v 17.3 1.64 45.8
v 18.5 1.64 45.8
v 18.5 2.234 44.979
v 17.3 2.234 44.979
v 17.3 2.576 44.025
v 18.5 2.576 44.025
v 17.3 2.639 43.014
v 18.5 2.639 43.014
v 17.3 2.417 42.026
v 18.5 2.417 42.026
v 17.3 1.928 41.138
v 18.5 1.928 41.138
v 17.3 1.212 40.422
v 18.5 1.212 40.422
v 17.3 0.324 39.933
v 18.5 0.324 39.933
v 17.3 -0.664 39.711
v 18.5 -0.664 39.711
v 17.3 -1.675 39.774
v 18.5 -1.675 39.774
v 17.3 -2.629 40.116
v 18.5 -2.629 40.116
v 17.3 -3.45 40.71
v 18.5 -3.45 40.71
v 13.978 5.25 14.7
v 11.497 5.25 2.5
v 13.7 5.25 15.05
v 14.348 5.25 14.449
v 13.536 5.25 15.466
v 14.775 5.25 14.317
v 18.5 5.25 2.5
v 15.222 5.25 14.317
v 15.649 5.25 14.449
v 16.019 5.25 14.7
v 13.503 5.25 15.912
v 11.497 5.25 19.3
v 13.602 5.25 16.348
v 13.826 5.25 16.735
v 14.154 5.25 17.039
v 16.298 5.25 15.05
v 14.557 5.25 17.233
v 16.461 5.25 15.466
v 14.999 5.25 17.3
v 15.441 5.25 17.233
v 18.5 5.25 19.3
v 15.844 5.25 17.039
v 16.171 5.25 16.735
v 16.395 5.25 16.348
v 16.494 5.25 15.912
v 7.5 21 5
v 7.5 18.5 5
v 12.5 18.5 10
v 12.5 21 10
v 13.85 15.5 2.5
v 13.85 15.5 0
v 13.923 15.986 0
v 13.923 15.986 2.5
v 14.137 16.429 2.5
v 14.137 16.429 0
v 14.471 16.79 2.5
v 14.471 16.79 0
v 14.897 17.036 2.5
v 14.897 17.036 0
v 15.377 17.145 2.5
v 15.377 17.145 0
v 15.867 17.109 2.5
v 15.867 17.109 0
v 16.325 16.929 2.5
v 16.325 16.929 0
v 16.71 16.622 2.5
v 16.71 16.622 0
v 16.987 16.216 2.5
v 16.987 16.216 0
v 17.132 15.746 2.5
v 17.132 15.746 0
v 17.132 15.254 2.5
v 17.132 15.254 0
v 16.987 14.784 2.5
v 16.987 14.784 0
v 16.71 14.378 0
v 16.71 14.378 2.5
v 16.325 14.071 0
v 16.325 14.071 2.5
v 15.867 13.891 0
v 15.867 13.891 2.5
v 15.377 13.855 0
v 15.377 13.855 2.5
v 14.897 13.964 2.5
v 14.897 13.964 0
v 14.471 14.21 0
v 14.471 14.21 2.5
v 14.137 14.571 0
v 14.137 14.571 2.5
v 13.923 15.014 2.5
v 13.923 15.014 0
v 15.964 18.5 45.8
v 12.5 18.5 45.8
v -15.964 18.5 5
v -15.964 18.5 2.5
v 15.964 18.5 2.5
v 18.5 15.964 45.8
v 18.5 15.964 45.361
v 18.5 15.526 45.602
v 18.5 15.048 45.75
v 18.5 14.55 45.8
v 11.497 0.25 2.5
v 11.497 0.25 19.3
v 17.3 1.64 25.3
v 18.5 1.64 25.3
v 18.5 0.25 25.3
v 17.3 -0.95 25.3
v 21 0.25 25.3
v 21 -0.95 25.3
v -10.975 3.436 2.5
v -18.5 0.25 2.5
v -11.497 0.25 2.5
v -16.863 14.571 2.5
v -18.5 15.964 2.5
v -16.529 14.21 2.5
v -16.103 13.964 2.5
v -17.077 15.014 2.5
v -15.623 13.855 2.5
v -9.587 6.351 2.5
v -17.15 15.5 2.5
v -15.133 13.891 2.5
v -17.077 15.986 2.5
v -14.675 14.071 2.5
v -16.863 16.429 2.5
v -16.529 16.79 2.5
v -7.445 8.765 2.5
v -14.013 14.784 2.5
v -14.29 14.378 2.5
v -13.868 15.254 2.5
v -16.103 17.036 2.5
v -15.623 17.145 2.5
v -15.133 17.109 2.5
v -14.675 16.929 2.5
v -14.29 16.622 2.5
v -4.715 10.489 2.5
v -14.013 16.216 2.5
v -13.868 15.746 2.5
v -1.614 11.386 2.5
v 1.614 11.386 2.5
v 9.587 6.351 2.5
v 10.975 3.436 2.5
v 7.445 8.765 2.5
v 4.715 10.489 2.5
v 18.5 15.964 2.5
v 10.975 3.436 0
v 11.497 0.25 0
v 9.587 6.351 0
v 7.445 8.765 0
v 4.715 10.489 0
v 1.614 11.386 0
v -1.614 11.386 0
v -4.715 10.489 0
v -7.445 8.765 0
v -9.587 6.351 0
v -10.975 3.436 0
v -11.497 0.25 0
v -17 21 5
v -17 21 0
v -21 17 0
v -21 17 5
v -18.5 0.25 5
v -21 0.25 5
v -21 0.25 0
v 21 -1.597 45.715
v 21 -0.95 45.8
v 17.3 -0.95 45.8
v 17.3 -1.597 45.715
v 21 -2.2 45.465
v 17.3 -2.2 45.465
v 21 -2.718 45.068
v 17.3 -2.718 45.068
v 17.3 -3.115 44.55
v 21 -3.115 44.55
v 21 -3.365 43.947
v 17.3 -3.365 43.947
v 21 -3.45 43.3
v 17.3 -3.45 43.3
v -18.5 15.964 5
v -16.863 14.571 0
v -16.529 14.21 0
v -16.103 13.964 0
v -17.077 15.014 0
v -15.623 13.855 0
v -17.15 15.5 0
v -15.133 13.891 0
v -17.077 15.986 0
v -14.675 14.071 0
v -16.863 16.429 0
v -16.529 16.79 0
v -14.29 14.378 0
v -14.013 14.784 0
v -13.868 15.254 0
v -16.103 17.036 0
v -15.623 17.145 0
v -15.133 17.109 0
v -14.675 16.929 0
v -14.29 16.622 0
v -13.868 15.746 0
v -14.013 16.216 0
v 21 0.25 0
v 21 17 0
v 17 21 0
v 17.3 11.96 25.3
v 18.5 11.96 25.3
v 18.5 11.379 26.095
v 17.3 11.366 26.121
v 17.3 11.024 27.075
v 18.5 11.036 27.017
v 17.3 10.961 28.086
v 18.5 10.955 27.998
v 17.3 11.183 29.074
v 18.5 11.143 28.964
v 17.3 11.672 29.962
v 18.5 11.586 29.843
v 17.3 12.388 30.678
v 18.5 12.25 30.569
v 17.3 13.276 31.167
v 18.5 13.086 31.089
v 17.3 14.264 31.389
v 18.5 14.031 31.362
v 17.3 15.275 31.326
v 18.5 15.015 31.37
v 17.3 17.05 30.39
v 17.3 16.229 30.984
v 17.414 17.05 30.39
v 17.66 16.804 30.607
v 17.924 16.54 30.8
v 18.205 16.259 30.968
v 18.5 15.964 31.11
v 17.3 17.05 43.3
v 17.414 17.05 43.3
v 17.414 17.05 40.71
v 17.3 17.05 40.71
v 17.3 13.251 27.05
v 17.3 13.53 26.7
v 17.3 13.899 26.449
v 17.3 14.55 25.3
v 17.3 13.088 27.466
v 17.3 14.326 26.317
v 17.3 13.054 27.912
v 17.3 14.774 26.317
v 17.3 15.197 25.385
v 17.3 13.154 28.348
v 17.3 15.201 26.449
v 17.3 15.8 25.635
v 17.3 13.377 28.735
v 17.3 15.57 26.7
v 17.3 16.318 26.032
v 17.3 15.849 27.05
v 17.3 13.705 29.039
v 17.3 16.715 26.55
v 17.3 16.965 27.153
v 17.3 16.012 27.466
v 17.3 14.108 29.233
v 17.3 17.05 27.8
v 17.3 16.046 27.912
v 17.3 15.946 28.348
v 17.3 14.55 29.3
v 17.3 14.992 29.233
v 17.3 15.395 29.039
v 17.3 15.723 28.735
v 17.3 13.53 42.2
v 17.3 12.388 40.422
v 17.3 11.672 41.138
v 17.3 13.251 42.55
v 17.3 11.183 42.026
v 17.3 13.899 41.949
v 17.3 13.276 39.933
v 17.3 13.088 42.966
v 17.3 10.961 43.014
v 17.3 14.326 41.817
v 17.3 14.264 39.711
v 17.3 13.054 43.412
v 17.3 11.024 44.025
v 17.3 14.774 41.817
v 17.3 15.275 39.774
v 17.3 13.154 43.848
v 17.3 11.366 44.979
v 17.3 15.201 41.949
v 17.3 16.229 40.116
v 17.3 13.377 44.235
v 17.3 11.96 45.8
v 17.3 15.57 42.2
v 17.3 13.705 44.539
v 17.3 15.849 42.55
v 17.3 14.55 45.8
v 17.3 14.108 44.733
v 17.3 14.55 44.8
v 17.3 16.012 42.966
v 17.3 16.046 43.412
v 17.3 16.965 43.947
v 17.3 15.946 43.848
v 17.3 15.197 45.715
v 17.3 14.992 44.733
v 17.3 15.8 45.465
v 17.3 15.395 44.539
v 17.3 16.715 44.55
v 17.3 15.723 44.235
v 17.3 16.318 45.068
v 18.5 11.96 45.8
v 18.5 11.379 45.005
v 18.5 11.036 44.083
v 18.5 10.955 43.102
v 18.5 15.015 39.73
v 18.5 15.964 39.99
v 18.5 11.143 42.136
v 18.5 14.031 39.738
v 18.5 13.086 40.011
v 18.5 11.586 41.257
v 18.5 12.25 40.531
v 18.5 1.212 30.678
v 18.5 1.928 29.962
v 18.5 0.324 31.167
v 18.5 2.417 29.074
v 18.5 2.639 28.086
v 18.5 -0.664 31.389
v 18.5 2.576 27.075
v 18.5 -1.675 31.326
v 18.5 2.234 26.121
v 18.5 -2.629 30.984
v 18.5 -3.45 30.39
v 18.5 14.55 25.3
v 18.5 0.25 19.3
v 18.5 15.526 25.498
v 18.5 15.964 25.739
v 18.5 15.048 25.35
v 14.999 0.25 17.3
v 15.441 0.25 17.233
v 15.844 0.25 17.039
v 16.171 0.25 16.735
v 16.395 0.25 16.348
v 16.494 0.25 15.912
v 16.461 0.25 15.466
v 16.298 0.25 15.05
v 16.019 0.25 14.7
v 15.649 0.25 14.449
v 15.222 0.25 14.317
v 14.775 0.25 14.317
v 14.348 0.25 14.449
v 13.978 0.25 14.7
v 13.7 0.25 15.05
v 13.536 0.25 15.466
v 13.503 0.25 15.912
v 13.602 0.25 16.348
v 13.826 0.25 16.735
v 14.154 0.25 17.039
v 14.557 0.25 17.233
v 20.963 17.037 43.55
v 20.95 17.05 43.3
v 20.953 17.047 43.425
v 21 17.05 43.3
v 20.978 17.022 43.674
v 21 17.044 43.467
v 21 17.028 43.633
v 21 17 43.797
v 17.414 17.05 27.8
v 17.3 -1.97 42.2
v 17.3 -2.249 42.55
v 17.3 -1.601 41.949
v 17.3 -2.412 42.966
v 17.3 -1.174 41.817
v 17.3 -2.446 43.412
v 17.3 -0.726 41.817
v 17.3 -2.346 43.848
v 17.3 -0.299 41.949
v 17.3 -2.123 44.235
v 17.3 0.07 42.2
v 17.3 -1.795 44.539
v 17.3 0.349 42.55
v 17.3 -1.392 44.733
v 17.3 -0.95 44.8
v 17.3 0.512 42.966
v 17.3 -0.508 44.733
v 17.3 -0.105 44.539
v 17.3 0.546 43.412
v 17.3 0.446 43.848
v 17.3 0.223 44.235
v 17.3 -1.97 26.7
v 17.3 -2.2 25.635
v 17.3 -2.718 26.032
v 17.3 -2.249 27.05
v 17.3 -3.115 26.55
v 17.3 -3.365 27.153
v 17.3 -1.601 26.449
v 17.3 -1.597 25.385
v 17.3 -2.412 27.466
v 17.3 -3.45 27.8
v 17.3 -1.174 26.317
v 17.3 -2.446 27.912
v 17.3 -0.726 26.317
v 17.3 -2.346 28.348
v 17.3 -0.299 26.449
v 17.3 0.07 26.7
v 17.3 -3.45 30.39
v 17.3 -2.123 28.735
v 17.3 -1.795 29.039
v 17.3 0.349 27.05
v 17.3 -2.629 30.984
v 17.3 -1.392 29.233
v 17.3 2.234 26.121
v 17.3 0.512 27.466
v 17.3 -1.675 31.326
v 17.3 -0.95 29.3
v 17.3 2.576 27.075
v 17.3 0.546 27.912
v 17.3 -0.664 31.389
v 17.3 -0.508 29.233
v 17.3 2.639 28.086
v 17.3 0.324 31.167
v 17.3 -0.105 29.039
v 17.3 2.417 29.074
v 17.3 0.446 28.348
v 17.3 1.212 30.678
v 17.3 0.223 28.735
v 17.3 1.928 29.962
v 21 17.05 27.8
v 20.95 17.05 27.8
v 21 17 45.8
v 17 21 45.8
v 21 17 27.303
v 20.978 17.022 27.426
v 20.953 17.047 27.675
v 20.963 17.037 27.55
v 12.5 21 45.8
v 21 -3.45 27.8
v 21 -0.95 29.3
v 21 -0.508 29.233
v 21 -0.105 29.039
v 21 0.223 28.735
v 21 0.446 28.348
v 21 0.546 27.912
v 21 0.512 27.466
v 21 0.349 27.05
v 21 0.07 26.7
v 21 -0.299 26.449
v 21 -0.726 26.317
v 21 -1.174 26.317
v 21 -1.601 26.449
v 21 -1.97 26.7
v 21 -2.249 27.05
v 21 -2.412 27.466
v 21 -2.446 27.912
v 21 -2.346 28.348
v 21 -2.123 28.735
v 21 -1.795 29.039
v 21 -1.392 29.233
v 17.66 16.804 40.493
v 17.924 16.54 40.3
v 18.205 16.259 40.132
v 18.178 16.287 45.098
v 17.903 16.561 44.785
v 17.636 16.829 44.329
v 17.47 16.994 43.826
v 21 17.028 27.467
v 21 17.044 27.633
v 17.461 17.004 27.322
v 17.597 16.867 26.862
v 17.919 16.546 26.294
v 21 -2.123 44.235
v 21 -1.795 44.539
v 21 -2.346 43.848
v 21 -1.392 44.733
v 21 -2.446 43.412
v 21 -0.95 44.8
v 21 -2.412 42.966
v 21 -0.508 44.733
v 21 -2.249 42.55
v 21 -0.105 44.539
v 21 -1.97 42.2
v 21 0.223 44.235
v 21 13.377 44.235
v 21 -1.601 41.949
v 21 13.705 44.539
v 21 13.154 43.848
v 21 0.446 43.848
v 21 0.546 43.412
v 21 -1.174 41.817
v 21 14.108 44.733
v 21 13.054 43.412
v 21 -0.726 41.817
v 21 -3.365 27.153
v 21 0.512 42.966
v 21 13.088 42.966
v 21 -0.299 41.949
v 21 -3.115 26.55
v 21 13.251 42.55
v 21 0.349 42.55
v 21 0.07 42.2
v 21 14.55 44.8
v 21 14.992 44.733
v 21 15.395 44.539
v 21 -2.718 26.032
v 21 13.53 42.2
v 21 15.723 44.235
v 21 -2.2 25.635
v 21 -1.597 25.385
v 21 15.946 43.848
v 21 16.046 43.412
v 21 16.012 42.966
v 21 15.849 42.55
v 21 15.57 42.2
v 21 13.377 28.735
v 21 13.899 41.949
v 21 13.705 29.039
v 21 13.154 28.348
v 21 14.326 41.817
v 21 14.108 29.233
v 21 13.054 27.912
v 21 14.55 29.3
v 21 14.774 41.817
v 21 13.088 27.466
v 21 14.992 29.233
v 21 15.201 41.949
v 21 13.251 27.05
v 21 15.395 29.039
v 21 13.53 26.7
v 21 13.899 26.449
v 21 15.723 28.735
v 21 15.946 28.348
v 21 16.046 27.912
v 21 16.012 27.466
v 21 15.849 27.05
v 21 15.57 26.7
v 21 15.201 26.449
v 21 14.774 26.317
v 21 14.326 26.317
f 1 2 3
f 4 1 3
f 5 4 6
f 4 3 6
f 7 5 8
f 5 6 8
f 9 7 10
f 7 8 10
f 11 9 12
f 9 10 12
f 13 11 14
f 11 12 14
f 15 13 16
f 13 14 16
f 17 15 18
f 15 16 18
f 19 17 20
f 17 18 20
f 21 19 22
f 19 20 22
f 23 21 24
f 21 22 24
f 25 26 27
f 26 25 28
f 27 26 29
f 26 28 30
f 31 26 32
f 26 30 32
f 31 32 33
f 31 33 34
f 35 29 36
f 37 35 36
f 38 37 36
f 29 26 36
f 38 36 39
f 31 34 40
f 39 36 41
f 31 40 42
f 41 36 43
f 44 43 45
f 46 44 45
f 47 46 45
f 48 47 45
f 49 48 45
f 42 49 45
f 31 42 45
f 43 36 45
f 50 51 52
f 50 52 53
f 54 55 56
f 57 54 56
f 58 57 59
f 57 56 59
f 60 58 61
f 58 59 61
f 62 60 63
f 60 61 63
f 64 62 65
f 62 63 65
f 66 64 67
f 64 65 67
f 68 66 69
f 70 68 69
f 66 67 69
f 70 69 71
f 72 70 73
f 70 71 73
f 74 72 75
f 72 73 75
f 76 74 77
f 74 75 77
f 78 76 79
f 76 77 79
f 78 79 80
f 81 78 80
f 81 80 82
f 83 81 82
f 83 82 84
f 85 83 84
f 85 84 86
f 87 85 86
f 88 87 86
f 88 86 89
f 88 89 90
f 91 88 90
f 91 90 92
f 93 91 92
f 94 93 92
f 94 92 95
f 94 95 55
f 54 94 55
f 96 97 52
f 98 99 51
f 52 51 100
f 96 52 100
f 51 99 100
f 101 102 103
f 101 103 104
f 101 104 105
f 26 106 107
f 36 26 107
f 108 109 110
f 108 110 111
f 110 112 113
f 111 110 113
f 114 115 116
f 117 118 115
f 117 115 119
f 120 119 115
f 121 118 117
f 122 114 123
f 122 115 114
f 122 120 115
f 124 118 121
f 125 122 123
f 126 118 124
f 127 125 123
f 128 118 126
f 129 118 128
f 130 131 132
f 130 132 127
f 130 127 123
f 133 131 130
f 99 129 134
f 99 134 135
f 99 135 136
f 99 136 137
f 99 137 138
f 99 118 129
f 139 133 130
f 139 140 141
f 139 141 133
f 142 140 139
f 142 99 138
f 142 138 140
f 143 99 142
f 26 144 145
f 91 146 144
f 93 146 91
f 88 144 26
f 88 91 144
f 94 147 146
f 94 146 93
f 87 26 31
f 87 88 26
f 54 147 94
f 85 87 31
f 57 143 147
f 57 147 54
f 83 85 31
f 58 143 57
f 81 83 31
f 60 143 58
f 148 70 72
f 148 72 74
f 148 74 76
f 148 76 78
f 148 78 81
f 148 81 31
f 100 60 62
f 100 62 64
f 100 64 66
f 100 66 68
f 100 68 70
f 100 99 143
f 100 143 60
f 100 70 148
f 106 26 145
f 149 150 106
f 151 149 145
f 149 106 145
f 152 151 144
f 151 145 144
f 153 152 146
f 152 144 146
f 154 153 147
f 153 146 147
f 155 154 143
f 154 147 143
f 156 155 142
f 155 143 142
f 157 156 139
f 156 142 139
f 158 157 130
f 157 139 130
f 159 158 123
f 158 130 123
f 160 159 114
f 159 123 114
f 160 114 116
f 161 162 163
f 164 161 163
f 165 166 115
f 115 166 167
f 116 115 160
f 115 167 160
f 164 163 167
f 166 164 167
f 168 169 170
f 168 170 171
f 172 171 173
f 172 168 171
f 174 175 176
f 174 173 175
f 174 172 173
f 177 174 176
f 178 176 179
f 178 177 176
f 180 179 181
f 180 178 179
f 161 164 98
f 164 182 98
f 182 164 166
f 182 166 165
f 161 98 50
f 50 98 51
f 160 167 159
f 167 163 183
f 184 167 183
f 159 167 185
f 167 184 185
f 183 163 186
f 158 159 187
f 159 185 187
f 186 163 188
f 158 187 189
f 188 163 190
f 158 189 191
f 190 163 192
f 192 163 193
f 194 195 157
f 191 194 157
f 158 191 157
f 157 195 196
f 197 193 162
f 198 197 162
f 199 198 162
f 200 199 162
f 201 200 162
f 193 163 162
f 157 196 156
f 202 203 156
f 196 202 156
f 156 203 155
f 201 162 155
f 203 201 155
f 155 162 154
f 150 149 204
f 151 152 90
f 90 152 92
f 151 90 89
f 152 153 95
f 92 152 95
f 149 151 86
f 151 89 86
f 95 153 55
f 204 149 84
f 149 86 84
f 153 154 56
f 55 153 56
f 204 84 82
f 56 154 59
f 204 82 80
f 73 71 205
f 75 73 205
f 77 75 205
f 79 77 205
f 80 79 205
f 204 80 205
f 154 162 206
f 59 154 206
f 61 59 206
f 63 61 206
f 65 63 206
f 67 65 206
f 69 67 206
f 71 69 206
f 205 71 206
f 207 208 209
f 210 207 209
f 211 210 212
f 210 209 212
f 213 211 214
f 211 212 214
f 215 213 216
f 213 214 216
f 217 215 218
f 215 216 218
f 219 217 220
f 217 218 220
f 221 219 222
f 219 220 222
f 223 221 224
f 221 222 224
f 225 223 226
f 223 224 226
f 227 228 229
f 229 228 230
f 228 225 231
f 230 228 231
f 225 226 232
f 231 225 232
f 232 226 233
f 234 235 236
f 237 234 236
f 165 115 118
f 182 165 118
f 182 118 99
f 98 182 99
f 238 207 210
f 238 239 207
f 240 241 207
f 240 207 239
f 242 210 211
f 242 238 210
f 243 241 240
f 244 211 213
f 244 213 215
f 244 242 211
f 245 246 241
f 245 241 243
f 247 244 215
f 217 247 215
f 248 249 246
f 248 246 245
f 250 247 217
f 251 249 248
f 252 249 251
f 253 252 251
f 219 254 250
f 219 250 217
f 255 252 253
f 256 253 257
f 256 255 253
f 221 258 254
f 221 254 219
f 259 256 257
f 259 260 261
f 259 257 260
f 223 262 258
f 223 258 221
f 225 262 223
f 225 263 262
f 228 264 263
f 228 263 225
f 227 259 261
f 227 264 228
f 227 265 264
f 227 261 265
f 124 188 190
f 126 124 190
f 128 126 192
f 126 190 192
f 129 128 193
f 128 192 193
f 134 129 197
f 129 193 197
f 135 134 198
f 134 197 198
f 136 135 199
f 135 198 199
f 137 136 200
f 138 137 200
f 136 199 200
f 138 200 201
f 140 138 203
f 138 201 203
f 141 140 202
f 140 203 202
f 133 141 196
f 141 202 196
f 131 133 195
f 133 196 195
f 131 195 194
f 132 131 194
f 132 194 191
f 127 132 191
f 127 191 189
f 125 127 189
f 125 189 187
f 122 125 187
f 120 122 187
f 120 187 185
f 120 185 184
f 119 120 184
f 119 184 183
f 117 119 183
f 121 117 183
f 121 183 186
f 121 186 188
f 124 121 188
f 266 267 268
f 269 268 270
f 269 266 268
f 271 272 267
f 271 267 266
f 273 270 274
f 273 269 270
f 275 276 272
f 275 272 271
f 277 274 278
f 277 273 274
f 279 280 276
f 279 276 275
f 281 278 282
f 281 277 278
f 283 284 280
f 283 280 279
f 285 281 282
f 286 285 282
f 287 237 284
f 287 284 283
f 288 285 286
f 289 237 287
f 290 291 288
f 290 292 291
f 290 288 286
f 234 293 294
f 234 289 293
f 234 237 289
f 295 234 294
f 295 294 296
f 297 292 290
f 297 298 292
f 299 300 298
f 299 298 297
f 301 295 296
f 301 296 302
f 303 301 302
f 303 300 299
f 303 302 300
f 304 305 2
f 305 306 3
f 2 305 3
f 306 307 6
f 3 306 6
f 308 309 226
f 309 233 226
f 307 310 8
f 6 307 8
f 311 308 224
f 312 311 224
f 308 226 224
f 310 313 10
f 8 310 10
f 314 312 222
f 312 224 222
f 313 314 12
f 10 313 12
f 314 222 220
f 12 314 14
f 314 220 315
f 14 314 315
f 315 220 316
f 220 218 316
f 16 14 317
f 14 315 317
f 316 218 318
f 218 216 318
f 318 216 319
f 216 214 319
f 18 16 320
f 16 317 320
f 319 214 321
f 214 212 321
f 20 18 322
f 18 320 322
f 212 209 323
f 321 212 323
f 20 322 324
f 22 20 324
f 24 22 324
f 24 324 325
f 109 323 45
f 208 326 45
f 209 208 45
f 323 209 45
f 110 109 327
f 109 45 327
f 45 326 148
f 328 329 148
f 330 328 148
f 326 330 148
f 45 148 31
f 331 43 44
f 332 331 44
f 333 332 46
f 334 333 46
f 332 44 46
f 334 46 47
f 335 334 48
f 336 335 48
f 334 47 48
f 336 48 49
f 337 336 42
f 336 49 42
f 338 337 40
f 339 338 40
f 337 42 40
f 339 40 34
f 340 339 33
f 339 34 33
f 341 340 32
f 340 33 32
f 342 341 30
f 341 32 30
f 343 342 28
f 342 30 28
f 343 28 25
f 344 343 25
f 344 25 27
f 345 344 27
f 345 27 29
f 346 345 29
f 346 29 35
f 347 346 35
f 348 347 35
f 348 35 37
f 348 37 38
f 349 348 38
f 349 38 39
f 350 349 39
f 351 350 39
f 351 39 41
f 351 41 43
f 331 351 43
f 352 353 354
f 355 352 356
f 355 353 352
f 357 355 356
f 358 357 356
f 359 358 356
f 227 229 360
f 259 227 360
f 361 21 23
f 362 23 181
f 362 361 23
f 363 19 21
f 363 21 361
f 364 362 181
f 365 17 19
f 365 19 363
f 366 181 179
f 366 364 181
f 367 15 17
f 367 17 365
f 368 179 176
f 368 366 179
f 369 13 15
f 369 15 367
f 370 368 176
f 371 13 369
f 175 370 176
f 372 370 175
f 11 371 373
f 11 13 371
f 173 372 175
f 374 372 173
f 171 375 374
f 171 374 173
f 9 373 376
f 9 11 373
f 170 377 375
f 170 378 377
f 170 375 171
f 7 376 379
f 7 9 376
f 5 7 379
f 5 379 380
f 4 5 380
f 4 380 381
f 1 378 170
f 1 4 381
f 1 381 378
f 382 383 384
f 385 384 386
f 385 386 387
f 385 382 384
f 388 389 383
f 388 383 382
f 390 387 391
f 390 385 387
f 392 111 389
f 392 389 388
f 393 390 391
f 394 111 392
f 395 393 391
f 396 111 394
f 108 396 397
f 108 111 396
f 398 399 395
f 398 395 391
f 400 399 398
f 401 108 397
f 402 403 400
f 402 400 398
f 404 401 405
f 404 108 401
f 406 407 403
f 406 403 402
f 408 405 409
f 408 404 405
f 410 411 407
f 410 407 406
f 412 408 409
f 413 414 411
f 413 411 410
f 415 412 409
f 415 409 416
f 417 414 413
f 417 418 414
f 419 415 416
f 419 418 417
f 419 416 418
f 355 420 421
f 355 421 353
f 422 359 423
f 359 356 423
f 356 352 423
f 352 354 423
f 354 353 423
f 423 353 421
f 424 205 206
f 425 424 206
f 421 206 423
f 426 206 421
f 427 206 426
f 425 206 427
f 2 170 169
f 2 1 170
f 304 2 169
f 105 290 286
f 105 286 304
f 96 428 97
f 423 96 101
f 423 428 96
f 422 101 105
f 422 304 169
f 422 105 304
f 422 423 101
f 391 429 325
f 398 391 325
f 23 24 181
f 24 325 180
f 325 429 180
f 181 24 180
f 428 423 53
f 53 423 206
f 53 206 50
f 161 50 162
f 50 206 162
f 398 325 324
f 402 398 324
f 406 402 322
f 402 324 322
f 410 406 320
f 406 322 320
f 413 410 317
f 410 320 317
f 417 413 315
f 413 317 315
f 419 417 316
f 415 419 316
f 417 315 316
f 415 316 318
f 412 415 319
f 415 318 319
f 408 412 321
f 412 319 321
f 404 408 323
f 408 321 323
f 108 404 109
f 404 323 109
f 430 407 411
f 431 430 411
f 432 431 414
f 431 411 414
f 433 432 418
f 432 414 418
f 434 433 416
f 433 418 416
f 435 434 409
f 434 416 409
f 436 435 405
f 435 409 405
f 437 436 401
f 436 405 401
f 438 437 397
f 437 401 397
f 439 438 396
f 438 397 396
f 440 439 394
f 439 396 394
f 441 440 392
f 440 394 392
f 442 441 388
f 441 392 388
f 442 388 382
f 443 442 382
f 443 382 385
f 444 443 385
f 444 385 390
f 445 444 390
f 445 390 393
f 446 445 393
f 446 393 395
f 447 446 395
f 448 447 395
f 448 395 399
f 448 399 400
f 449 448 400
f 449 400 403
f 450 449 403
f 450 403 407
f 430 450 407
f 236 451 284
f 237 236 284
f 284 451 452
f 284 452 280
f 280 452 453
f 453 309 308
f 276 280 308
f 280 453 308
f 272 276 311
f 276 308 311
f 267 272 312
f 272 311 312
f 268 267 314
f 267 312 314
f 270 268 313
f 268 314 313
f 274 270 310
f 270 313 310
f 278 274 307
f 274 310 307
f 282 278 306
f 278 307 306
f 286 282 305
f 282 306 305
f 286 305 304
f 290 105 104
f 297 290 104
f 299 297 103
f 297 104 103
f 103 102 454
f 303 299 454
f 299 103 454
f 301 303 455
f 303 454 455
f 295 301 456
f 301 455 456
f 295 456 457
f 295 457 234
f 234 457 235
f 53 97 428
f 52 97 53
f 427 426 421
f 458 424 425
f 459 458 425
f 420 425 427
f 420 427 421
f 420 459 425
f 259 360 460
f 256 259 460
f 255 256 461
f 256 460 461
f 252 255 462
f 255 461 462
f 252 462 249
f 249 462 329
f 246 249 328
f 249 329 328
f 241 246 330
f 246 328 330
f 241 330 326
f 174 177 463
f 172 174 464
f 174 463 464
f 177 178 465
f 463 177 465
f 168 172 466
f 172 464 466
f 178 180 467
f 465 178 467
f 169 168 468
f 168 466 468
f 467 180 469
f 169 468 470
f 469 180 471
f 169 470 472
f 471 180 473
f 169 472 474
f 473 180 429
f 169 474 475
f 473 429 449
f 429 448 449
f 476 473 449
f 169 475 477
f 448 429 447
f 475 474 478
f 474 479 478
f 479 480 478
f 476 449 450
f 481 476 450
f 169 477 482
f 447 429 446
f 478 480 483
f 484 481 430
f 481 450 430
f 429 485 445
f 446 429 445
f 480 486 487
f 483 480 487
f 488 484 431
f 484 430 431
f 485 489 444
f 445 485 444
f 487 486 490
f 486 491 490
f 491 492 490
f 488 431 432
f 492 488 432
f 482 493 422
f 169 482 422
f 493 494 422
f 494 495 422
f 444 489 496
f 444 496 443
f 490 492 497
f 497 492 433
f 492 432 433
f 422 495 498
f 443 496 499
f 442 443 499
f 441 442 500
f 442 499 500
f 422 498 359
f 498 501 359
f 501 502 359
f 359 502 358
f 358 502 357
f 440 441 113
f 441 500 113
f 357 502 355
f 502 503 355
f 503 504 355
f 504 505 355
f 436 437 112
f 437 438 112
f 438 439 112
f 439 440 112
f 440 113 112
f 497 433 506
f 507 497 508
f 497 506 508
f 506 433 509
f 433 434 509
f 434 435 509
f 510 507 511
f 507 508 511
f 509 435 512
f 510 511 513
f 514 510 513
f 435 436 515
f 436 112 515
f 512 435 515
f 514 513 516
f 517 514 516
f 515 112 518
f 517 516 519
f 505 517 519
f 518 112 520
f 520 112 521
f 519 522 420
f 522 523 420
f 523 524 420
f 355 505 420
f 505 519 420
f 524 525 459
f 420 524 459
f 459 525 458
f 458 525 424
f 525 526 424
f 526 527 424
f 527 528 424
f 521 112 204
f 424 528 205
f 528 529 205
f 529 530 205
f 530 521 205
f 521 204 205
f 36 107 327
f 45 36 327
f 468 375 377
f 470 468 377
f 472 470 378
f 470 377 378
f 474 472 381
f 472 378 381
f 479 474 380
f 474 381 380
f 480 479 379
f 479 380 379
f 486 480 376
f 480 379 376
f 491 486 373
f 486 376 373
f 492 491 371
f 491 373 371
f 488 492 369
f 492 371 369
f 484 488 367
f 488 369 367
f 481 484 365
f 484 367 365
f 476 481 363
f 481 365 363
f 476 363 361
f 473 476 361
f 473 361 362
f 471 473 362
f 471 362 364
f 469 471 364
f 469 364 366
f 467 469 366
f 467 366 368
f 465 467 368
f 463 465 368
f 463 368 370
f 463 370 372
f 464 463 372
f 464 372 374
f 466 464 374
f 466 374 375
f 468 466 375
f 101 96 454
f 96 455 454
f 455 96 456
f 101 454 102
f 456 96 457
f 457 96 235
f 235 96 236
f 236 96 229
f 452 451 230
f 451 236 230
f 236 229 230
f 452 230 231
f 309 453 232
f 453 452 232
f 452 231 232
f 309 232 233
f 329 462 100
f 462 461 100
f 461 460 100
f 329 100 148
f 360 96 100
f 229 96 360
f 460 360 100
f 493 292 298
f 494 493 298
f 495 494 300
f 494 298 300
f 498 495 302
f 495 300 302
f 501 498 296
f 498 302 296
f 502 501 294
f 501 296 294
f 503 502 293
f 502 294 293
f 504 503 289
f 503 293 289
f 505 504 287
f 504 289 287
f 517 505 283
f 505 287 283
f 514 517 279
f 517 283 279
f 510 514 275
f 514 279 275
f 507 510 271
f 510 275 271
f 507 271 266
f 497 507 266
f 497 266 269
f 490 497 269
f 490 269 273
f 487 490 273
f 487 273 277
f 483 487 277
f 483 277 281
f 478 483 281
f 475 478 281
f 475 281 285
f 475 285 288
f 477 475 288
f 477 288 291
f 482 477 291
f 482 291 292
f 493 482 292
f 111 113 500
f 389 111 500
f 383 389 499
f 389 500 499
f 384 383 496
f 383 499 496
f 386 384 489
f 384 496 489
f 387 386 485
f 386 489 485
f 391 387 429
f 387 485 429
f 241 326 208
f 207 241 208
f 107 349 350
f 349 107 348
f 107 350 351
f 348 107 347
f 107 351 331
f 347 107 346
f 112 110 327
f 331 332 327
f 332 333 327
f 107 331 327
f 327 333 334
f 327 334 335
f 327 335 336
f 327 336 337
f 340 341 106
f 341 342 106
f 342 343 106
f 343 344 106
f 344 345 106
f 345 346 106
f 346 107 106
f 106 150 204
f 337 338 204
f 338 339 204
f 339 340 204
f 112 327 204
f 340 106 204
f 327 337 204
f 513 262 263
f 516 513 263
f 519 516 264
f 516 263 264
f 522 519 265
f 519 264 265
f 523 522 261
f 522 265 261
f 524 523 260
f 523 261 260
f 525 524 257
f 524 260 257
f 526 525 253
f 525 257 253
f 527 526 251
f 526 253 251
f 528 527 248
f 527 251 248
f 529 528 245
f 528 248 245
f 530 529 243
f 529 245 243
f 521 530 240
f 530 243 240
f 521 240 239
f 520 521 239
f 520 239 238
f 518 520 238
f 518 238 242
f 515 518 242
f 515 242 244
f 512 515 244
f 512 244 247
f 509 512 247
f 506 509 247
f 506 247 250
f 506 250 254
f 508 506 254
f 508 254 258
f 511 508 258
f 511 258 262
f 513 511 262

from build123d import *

# Parameters (mm, degrees)
BOSS_EXTRUDE1_DEPTH     = 2.5
SKETCH2_R               = 11.5
CUT_EXTRUDE1_DEPTH      = 3
SKETCH3_R               = 1.65
CUT_EXTRUDE2_DEPTH      = 3
EXTRUDE_THIN1_DEPTH     = 43.3
BOSS_EXTRUDE2_DEPTH     = 2.5
CUT_EXTRUDE3_DEPTH      = 57.003950753
CUT_EXTRUDE3_DEPTH_BACK = 57.003950753
SKETCH7_W               = 33.5
SKETCH7_H               = 40.8
CHAMFER1_SIZE           = 5
BOSS_EXTRUDE3_DEPTH     = 1.2
SKETCH10_R              = 1.5
CUT_EXTRUDE4_DEPTH      = 10
SKETCH12_W              = 9.502717712
SKETCH12_H              = 19.3
BOSS_EXTRUDE4_DEPTH     = 5
SKETCH13_R              = 1.5
CUT_EXTRUDE5_DEPTH      = 53.789227121


with BuildPart() as part:
    # Sketch1 → Boss-Extrude1 (new body)
    with BuildSketch(Plane.XY):
        Polygon((-21, 0.25), (21, 0.25), (21, 17), (17, 21), (-17, 21), (-21, 17), align=None)
    extrude(amount=BOSS_EXTRUDE1_DEPTH)

    # Sketch2 → Cut-Extrude1 (cut)
    with BuildSketch(Plane.XY.offset(2.5)):
        Circle(SKETCH2_R)
    extrude(amount=-CUT_EXTRUDE1_DEPTH, mode=Mode.SUBTRACT)

    # Sketch3 → Cut-Extrude2 (cut)
    with BuildSketch(Plane(origin=(0, 0, 0), x_dir=(-1, 0, 0), z_dir=(0, 0, -1))):
        with Locations((15.5, 15.5)):
            Circle(SKETCH3_R)
        with Locations((-15.5, 15.5)):
            Circle(SKETCH3_R)
    extrude(amount=-CUT_EXTRUDE2_DEPTH, mode=Mode.SUBTRACT)

    # Sketch4 → Extrude-Thin1 (add)
    with BuildSketch(Plane.XY.offset(2.5)):
        Polygon((21, 0.25), (21, 17), (17, 21), (-17, 21), (-21, 17), (-21, 0.25), (-18.5, 0.25), (-18.5, 15.964466094), (-15.964466094, 18.5), (15.964466094, 18.5), (18.5, 15.964466094), (18.5, 0.25), align=None)
    extrude(amount=EXTRUDE_THIN1_DEPTH)

    # Sketch6 → Boss-Extrude2 (add)
    with BuildSketch(Plane(origin=(21, 0, 0), x_dir=(0, 0, -1), z_dir=(1, 0, 0))):
        with BuildLine():
            Line((-45.8, 14.55), (-45.8, -0.95))
            ThreePointArc((-45.8, -0.95), (-45.067766953, -2.717766953), (-43.3, -3.45))
            Line((-43.3, -3.45), (-27.8, -3.45))
            ThreePointArc((-27.8, -3.45), (-26.032233047, -2.717766953), (-25.3, -0.95))
            Line((-25.3, -0.95), (-25.3, 14.55))
            ThreePointArc((-25.3, 14.55), (-26.032233047, 16.317766953), (-27.8, 17.05))
            Line((-27.8, 17.05), (-43.3, 17.05))
            ThreePointArc((-43.3, 17.05), (-45.067766953, 16.317766953), (-45.8, 14.55))
        make_face()
    extrude(amount=-BOSS_EXTRUDE2_DEPTH)

    # Sketch7 → Cut-Extrude3 (cut, two sides: drawn at the far end of the back side and taken through both)
    with BuildSketch(Plane(origin=(0, 21, 0), x_dir=(1, 0, 0), z_dir=(0, 1, 0)).offset(-CUT_EXTRUDE3_DEPTH_BACK)):
        with Locations((-4.25, -25.4)):
            Rectangle(SKETCH7_W, SKETCH7_H)
    extrude(amount=CUT_EXTRUDE3_DEPTH + CUT_EXTRUDE3_DEPTH_BACK, mode=Mode.SUBTRACT)

    # Chamfer1
    chamfer1_edges = [part.edges().sort_by_distance(p)[0] for p in [
        (12.5, 19.75, 5),
    ]]
    chamfer(chamfer1_edges, length=CHAMFER1_SIZE)

    # Sketch8 → Boss-Extrude3 (add)
    with BuildSketch(Plane.ZY.offset(-18.5)):
        with BuildLine():
            Line((27.8, -3.45), (30.390366769, -3.45))
            ThreePointArc((30.390366769, -3.45), (30.345584412, 1.595584412), (25.3, 1.640366769))
            Line((25.3, 1.640366769), (25.3, -0.95))
            ThreePointArc((25.3, -0.95), (26.032233047, -2.717766953), (27.8, -3.45))
        make_face()
        with BuildLine():
            Line((45.8, -0.95), (45.8, 1.640366769))
            ThreePointArc((45.8, 1.640366769), (40.754415588, 1.595584412), (40.709633231, -3.45))
            Line((40.709633231, -3.45), (43.3, -3.45))
            ThreePointArc((43.3, -3.45), (45.067766953, -2.717766953), (45.8, -0.95))
        make_face()
        with BuildLine():
            Line((43.3, 17.05), (40.709633231, 17.05))
            ThreePointArc((40.709633231, 17.05), (40.754415588, 12.004415588), (45.8, 11.959633231))
            Line((45.8, 11.959633231), (45.8, 14.55))
            ThreePointArc((45.8, 14.55), (45.067766953, 16.317766953), (43.3, 17.05))
        make_face()
        with BuildLine():
            Line((25.3, 14.55), (25.3, 11.959633231))
            ThreePointArc((25.3, 11.959633231), (30.345584412, 12.004415588), (30.390366769, 17.05))
            Line((30.390366769, 17.05), (27.8, 17.05))
            ThreePointArc((27.8, 17.05), (26.032233047, 16.317766953), (25.3, 14.55))
        make_face()
    extrude(amount=BOSS_EXTRUDE3_DEPTH)

    # Sketch10 → Cut-Extrude4 (cut)
    with BuildSketch(Plane.ZY.offset(-17.3)):
        with Locations((43.3, 14.55)):
            Circle(SKETCH10_R)
        with Locations((27.8, 14.55)):
            Circle(SKETCH10_R)
        with Locations((27.8, -0.95)):
            Circle(SKETCH10_R)
        with Locations((43.3, -0.95)):
            Circle(SKETCH10_R)
    extrude(amount=-CUT_EXTRUDE4_DEPTH, mode=Mode.SUBTRACT)

    # Sketch12 → Boss-Extrude4 (add)
    with BuildSketch(Plane.XZ.offset(-0.25)):
        with Locations((16.248641144, 9.65)):
            Rectangle(SKETCH12_W, SKETCH12_H)
    extrude(amount=-BOSS_EXTRUDE4_DEPTH)

    # Sketch13 → Cut-Extrude5 (cut, through all)
    with BuildSketch(Plane(origin=(0, 5.25, 0), x_dir=(1, 0, 0), z_dir=(0, 1, 0))):
        with Locations(Location((14.998641144, -15.8, 0), (0, 0, 270))):
            Circle(SKETCH13_R)
    extrude(amount=-CUT_EXTRUDE5_DEPTH, mode=Mode.SUBTRACT)


solid = part.part
